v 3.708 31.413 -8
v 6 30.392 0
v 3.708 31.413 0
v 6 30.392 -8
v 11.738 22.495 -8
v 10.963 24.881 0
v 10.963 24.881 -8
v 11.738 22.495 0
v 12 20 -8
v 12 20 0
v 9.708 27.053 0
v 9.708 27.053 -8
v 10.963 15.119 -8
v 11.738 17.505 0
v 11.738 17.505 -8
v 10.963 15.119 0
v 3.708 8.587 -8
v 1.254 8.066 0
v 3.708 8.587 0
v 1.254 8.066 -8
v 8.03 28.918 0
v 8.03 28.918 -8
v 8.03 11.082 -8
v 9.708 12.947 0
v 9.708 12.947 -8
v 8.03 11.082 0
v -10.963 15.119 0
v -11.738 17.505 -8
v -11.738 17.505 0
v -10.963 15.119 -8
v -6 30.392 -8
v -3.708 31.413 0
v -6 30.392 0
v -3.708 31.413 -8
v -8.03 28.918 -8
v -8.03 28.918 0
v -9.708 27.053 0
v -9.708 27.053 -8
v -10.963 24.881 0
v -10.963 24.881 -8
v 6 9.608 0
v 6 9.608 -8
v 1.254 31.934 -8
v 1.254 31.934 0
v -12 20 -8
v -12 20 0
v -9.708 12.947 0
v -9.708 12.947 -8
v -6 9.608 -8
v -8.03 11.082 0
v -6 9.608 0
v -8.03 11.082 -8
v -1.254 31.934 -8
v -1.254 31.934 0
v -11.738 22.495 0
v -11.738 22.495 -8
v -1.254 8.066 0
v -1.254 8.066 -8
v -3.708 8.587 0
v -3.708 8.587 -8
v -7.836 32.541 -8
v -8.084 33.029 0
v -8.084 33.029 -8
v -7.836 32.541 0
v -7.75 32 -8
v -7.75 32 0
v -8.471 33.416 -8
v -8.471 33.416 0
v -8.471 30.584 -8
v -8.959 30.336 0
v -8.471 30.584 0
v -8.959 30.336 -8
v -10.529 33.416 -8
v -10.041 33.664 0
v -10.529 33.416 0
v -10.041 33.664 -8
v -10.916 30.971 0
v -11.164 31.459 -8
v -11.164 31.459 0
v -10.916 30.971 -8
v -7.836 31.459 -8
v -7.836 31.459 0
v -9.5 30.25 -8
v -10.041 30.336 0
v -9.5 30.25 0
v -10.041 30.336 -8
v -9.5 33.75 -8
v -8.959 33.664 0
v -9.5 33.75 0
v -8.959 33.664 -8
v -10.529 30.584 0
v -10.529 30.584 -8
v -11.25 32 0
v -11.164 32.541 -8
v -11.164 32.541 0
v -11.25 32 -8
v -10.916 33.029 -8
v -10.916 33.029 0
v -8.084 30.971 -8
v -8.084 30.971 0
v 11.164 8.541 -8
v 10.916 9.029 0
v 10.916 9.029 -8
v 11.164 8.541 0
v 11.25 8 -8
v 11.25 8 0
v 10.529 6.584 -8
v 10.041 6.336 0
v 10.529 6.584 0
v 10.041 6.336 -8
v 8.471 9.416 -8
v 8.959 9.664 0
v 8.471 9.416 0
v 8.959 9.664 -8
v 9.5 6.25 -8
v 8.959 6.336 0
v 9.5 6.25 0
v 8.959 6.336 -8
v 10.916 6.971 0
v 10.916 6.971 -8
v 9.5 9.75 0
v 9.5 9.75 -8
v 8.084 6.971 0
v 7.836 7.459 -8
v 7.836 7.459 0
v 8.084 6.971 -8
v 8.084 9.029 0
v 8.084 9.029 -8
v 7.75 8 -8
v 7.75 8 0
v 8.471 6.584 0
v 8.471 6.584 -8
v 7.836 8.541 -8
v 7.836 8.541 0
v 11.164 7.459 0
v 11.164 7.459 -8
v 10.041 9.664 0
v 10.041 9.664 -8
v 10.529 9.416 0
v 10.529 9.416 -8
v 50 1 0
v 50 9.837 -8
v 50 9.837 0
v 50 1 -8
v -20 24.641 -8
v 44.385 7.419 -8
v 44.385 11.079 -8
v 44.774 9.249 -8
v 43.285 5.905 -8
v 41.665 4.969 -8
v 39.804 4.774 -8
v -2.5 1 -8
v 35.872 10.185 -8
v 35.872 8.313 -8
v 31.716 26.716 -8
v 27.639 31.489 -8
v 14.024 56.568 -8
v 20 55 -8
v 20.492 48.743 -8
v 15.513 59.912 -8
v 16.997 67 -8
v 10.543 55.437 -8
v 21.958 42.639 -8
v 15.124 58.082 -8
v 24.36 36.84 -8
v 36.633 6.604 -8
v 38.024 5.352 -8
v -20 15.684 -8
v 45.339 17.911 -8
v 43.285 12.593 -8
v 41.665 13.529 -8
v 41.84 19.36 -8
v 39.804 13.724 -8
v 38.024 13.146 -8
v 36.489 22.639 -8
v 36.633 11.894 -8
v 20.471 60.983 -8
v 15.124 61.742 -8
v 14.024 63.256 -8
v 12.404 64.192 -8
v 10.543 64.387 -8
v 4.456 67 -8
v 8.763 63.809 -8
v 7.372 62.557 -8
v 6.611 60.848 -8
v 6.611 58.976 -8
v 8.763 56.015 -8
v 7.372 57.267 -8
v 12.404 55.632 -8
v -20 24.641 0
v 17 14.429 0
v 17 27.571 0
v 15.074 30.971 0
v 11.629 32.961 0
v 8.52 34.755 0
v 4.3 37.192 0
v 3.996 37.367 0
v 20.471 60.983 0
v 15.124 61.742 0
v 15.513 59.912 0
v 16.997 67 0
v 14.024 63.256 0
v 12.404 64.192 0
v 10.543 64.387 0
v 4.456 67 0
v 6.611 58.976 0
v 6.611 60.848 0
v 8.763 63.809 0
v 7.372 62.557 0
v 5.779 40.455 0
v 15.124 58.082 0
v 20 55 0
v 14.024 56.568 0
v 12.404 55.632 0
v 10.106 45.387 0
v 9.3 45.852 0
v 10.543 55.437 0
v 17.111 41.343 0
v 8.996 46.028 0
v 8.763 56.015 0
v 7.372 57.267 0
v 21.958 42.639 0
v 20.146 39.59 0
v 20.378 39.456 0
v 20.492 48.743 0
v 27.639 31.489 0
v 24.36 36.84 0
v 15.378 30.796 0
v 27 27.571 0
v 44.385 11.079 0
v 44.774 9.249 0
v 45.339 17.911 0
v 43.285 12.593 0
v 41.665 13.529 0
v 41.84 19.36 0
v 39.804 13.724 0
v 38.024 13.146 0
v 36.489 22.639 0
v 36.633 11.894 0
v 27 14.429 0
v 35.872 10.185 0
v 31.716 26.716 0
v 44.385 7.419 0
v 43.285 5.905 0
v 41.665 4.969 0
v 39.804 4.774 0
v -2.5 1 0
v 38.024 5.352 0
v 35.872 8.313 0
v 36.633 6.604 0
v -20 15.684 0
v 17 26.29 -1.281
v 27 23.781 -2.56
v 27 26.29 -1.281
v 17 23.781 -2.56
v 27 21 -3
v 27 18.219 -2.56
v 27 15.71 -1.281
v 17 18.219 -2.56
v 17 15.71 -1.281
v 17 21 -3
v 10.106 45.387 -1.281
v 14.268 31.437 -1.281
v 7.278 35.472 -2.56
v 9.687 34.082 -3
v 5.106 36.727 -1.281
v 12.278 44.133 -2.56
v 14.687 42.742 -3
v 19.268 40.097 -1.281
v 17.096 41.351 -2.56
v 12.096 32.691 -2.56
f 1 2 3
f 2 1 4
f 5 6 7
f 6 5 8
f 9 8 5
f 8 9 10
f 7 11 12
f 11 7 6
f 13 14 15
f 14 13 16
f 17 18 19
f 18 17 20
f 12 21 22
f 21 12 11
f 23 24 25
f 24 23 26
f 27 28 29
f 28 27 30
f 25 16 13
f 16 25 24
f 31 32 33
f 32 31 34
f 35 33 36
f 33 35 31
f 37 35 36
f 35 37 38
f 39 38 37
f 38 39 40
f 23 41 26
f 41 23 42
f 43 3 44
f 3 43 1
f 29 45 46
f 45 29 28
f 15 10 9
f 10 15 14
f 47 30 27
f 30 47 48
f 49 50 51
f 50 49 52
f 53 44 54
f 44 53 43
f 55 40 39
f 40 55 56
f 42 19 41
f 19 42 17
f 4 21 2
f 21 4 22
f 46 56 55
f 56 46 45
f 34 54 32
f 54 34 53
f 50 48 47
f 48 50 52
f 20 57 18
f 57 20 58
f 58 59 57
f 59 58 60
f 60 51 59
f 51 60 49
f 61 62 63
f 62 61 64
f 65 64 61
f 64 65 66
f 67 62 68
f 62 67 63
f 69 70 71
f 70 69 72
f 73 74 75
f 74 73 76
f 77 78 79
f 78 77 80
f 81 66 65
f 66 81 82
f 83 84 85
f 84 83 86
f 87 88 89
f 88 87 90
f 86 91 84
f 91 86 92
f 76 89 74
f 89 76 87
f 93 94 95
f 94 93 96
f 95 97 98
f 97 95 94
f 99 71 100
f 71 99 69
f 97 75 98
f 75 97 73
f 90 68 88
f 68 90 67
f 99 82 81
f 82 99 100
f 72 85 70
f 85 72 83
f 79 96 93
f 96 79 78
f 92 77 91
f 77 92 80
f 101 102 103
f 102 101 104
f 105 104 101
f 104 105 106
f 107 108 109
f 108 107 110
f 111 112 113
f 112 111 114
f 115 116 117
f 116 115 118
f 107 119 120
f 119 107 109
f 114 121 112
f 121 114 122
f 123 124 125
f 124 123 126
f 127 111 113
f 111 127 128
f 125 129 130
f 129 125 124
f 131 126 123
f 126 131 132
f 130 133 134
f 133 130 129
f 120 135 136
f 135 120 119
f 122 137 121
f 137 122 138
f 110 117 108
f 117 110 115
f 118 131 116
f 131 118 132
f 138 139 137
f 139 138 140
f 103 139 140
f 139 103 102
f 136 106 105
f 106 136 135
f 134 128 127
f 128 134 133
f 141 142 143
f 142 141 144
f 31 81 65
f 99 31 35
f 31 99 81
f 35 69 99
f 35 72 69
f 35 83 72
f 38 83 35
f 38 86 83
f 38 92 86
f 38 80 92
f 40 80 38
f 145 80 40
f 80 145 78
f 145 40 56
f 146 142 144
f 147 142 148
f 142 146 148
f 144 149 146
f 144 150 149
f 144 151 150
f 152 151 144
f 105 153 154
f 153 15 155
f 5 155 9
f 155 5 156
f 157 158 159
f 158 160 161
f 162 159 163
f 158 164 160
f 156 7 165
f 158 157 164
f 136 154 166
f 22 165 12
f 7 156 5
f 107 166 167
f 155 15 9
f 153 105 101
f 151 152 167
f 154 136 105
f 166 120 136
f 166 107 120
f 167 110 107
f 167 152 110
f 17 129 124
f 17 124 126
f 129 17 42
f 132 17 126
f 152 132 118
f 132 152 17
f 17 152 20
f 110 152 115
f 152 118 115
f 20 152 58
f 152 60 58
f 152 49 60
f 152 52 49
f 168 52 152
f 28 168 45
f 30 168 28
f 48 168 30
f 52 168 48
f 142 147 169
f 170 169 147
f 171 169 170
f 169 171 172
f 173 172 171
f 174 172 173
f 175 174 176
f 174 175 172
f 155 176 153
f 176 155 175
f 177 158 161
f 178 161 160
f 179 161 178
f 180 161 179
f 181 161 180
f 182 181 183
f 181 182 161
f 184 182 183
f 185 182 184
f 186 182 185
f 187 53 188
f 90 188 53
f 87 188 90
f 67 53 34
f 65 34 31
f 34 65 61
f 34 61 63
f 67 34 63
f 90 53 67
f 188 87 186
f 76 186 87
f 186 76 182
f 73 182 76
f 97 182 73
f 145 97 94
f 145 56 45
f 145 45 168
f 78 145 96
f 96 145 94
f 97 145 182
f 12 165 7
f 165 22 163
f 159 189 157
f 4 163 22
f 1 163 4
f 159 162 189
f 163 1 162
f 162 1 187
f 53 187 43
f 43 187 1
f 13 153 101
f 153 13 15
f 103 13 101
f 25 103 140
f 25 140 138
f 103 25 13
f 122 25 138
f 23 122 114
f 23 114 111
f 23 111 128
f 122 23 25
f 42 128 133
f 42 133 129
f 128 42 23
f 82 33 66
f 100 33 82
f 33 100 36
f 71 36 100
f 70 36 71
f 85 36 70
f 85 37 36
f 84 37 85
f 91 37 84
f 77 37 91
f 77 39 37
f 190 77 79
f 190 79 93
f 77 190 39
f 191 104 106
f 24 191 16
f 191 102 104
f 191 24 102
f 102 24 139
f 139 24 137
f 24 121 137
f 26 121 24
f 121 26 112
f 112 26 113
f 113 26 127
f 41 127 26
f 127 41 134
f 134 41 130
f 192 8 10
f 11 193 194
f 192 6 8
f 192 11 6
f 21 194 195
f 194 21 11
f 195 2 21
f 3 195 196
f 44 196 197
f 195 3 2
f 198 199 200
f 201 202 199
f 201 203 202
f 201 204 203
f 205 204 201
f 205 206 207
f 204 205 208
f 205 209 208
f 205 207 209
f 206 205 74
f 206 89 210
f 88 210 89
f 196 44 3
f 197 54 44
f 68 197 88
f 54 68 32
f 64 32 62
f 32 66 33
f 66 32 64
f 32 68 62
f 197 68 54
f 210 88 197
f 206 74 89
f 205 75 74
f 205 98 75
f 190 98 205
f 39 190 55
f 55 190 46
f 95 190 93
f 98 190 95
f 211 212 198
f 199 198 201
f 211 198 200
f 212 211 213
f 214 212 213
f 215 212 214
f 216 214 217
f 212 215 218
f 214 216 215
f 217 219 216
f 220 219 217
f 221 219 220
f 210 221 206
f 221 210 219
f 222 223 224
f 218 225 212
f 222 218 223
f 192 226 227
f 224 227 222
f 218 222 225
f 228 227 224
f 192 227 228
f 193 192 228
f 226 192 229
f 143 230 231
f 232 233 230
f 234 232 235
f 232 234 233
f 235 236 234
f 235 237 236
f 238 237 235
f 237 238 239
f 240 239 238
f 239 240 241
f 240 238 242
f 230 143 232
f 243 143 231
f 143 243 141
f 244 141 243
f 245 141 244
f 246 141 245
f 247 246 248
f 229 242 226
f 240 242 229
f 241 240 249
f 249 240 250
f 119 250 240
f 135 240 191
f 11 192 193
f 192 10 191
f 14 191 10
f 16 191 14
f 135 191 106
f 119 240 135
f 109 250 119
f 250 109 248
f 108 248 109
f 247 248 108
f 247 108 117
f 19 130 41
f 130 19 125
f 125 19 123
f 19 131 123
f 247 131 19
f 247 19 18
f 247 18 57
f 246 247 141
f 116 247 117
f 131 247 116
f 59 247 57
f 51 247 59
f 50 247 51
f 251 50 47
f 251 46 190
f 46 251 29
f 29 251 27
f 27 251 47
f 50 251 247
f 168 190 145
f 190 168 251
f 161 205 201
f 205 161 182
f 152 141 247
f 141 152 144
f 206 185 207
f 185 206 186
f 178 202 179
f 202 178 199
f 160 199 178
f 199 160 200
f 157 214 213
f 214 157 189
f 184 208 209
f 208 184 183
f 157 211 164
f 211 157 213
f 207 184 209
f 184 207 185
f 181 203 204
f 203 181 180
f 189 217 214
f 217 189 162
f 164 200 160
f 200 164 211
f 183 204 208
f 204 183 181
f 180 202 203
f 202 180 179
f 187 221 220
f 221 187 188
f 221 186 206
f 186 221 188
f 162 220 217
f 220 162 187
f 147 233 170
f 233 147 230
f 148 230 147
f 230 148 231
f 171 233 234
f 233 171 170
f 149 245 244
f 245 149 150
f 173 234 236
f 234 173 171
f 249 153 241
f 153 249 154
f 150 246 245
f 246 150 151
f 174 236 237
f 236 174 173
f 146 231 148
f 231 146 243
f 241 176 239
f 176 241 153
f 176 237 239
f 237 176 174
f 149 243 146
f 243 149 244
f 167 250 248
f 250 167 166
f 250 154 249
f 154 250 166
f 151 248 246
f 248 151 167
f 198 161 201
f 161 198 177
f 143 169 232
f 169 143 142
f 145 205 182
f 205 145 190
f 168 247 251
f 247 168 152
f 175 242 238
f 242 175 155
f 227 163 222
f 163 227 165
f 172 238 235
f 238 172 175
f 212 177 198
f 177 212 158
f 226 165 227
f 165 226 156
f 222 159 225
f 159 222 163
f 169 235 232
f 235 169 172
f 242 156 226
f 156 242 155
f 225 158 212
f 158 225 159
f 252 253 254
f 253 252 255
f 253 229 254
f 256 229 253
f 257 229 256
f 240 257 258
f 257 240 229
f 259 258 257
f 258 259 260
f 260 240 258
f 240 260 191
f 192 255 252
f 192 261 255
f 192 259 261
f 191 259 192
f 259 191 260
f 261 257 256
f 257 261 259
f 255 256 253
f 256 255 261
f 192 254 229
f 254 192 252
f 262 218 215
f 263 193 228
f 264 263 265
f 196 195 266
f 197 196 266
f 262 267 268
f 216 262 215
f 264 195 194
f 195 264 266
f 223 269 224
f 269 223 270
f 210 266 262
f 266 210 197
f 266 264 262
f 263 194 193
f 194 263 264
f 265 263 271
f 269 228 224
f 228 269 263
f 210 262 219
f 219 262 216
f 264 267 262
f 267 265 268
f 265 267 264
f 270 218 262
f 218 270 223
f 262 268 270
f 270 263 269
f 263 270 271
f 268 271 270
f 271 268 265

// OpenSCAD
// file: ../configuration.scad
// PRUSA Mendel  
// Configuration file
// GNU GPL v2
// Josef Pra
// josefprusa@me.com
// prusadjs.cz
// http://www.reprap.org/wiki/Prusa_Mendel
// http://github.com/prusajr/PrusaMendel


// PLEASE SELECT ONE OF THE CONFIGURATIONS BELOW
// BY UN-COMMENTING IT


variant=0; //0 for metric
//variant=1; //1 for SAE
if(variant==0){
echo("variant: metric");
}else if(variant==1){
echo("variant: sae");
} else{
echo("WARNING: INVALID CONFIGURATION");
}




vars=[
//[m8_dia, m8_nut, m4_dia, m4_nut, m3_dia, m3_nut, bush_dia, mot_shaft, bush_rod, bush_outerdia, bush_length]
[9,16.4,5,9,4.4,7,11,5.3,8,16,11],//metric
[9,15.7,5.5,10.6,5.5,10.6,11.5,5.3,7.9375,16,11]//SAE
];


//BUSHING TYPE Can generate three versions
// 1 - regular old ones
// 2 - helical ones
// 3 - holders for brass or any other bought bushings
bushing_type = 2;


//Round corner diameter
round_corner_diameter = 8;


//Thin wall size
layer_height = 0.4;
perimeter_width_over_thicknes = 1.6;
infill_widht_over_thickness = 1.55;
thin_wall = 2*(perimeter_width_over_thicknes*layer_height+infill_widht_over_thickness*layer_height);
if(thin_wall<2){
	echo("Check thin wall size, its below 2mm!");
}
echo(thin_wall);


//DO NOT TOUCH THIS SECTION!
m8_diameter = vars[variant][0];
m8_nut_diameter = vars[variant][1];
m4_diameter = vars[variant][2];
m4_nut_diameter = vars[variant][3];
m3_diameter = vars[variant][4];
m3_nut_diameter = vars[variant][5];
bushing_diameter = vars[variant][6];
motor_shaft=vars[variant][7];
bushing_rodsize = vars[variant][8];
bushing_outerDiameter = vars[variant][9];
bushing_lenght = vars[variant][10];




// MINI-HUXLEY VERSION (TODO, just place holder)
// include <configuration-huxley.scad>


// MEGA VERSION (TODO, just place holder)
// include <configuration-mega.scad>




// Some basic functions, probably should be somewhere else
module roundcorner(diameter){
	difference(){
		cube(size = [diameter,diameter,99], center = false);
		translate(v = [diameter, diameter, 0]) cylinder(h = 100, r=diameter, center=true);
	}
}
// main file
// This attaches to a frame vertex using the M8 rods and gives a holder for an XLR power connector.
// Adrian 12 May 2011

include <../configuration.scad>

outer_diameter = m8_diameter/2+3.3;

//dxf_linear_extrude(file = "../vertex-body-fixed-qcad.dxf",height=1,center=true);


module xlr_bracket()
{
	mirror([0,0,1])// comment out to mount on the other side
	difference()
	{
		translate([-20, 1, 0])
			cube([70,66,8]);
		
		translate([11.013,59.912]) cylinder(h=30,r=(m8_diameter/2),center=true); 
		translate([40.274,9.249,0]) cylinder(h=30,r=(m8_diameter/2),center=true); 
		
		translate([0, 20, 0])
		{
			cylinder(h=30,r=12,center=true,$fn=30);
			translate([-9.5,12,0])
				cylinder(h=30,r=1.75,center=true,$fn=20);
			translate([9.5,-12,0])
				cylinder(h=30,r=1.75,center=true,$fn=20);
		}
		
		
		
		translate([73, 70, 0])
			rotate([0,0,-60])
				cube([100,100,30], center=true);
		
		translate([-40, 90, 0])
			rotate([0,0,60])
				cube([100,100,30], center=true);
		
		translate([-35, -37, 0])
			rotate([0,0,-40])
				cube([100,100,30], center=true);
		
		translate([60, 55, 0])
			cylinder(r=40,h=30, center=true,$fn=40);
		
		
		translate([22,21,-6])
			rotate([0,90,0])
				cylinder(h=10,r=9,center=true,$fn=20);
		translate([13.687,41.010,-6]) rotate(a=60,v=[0,0,1])
			rotate([0,90,0])
				translate([0,0,-3])
					cylinder(h=10,r=9,center=true,$fn=20);		
	}
}


xlr_bracket();
